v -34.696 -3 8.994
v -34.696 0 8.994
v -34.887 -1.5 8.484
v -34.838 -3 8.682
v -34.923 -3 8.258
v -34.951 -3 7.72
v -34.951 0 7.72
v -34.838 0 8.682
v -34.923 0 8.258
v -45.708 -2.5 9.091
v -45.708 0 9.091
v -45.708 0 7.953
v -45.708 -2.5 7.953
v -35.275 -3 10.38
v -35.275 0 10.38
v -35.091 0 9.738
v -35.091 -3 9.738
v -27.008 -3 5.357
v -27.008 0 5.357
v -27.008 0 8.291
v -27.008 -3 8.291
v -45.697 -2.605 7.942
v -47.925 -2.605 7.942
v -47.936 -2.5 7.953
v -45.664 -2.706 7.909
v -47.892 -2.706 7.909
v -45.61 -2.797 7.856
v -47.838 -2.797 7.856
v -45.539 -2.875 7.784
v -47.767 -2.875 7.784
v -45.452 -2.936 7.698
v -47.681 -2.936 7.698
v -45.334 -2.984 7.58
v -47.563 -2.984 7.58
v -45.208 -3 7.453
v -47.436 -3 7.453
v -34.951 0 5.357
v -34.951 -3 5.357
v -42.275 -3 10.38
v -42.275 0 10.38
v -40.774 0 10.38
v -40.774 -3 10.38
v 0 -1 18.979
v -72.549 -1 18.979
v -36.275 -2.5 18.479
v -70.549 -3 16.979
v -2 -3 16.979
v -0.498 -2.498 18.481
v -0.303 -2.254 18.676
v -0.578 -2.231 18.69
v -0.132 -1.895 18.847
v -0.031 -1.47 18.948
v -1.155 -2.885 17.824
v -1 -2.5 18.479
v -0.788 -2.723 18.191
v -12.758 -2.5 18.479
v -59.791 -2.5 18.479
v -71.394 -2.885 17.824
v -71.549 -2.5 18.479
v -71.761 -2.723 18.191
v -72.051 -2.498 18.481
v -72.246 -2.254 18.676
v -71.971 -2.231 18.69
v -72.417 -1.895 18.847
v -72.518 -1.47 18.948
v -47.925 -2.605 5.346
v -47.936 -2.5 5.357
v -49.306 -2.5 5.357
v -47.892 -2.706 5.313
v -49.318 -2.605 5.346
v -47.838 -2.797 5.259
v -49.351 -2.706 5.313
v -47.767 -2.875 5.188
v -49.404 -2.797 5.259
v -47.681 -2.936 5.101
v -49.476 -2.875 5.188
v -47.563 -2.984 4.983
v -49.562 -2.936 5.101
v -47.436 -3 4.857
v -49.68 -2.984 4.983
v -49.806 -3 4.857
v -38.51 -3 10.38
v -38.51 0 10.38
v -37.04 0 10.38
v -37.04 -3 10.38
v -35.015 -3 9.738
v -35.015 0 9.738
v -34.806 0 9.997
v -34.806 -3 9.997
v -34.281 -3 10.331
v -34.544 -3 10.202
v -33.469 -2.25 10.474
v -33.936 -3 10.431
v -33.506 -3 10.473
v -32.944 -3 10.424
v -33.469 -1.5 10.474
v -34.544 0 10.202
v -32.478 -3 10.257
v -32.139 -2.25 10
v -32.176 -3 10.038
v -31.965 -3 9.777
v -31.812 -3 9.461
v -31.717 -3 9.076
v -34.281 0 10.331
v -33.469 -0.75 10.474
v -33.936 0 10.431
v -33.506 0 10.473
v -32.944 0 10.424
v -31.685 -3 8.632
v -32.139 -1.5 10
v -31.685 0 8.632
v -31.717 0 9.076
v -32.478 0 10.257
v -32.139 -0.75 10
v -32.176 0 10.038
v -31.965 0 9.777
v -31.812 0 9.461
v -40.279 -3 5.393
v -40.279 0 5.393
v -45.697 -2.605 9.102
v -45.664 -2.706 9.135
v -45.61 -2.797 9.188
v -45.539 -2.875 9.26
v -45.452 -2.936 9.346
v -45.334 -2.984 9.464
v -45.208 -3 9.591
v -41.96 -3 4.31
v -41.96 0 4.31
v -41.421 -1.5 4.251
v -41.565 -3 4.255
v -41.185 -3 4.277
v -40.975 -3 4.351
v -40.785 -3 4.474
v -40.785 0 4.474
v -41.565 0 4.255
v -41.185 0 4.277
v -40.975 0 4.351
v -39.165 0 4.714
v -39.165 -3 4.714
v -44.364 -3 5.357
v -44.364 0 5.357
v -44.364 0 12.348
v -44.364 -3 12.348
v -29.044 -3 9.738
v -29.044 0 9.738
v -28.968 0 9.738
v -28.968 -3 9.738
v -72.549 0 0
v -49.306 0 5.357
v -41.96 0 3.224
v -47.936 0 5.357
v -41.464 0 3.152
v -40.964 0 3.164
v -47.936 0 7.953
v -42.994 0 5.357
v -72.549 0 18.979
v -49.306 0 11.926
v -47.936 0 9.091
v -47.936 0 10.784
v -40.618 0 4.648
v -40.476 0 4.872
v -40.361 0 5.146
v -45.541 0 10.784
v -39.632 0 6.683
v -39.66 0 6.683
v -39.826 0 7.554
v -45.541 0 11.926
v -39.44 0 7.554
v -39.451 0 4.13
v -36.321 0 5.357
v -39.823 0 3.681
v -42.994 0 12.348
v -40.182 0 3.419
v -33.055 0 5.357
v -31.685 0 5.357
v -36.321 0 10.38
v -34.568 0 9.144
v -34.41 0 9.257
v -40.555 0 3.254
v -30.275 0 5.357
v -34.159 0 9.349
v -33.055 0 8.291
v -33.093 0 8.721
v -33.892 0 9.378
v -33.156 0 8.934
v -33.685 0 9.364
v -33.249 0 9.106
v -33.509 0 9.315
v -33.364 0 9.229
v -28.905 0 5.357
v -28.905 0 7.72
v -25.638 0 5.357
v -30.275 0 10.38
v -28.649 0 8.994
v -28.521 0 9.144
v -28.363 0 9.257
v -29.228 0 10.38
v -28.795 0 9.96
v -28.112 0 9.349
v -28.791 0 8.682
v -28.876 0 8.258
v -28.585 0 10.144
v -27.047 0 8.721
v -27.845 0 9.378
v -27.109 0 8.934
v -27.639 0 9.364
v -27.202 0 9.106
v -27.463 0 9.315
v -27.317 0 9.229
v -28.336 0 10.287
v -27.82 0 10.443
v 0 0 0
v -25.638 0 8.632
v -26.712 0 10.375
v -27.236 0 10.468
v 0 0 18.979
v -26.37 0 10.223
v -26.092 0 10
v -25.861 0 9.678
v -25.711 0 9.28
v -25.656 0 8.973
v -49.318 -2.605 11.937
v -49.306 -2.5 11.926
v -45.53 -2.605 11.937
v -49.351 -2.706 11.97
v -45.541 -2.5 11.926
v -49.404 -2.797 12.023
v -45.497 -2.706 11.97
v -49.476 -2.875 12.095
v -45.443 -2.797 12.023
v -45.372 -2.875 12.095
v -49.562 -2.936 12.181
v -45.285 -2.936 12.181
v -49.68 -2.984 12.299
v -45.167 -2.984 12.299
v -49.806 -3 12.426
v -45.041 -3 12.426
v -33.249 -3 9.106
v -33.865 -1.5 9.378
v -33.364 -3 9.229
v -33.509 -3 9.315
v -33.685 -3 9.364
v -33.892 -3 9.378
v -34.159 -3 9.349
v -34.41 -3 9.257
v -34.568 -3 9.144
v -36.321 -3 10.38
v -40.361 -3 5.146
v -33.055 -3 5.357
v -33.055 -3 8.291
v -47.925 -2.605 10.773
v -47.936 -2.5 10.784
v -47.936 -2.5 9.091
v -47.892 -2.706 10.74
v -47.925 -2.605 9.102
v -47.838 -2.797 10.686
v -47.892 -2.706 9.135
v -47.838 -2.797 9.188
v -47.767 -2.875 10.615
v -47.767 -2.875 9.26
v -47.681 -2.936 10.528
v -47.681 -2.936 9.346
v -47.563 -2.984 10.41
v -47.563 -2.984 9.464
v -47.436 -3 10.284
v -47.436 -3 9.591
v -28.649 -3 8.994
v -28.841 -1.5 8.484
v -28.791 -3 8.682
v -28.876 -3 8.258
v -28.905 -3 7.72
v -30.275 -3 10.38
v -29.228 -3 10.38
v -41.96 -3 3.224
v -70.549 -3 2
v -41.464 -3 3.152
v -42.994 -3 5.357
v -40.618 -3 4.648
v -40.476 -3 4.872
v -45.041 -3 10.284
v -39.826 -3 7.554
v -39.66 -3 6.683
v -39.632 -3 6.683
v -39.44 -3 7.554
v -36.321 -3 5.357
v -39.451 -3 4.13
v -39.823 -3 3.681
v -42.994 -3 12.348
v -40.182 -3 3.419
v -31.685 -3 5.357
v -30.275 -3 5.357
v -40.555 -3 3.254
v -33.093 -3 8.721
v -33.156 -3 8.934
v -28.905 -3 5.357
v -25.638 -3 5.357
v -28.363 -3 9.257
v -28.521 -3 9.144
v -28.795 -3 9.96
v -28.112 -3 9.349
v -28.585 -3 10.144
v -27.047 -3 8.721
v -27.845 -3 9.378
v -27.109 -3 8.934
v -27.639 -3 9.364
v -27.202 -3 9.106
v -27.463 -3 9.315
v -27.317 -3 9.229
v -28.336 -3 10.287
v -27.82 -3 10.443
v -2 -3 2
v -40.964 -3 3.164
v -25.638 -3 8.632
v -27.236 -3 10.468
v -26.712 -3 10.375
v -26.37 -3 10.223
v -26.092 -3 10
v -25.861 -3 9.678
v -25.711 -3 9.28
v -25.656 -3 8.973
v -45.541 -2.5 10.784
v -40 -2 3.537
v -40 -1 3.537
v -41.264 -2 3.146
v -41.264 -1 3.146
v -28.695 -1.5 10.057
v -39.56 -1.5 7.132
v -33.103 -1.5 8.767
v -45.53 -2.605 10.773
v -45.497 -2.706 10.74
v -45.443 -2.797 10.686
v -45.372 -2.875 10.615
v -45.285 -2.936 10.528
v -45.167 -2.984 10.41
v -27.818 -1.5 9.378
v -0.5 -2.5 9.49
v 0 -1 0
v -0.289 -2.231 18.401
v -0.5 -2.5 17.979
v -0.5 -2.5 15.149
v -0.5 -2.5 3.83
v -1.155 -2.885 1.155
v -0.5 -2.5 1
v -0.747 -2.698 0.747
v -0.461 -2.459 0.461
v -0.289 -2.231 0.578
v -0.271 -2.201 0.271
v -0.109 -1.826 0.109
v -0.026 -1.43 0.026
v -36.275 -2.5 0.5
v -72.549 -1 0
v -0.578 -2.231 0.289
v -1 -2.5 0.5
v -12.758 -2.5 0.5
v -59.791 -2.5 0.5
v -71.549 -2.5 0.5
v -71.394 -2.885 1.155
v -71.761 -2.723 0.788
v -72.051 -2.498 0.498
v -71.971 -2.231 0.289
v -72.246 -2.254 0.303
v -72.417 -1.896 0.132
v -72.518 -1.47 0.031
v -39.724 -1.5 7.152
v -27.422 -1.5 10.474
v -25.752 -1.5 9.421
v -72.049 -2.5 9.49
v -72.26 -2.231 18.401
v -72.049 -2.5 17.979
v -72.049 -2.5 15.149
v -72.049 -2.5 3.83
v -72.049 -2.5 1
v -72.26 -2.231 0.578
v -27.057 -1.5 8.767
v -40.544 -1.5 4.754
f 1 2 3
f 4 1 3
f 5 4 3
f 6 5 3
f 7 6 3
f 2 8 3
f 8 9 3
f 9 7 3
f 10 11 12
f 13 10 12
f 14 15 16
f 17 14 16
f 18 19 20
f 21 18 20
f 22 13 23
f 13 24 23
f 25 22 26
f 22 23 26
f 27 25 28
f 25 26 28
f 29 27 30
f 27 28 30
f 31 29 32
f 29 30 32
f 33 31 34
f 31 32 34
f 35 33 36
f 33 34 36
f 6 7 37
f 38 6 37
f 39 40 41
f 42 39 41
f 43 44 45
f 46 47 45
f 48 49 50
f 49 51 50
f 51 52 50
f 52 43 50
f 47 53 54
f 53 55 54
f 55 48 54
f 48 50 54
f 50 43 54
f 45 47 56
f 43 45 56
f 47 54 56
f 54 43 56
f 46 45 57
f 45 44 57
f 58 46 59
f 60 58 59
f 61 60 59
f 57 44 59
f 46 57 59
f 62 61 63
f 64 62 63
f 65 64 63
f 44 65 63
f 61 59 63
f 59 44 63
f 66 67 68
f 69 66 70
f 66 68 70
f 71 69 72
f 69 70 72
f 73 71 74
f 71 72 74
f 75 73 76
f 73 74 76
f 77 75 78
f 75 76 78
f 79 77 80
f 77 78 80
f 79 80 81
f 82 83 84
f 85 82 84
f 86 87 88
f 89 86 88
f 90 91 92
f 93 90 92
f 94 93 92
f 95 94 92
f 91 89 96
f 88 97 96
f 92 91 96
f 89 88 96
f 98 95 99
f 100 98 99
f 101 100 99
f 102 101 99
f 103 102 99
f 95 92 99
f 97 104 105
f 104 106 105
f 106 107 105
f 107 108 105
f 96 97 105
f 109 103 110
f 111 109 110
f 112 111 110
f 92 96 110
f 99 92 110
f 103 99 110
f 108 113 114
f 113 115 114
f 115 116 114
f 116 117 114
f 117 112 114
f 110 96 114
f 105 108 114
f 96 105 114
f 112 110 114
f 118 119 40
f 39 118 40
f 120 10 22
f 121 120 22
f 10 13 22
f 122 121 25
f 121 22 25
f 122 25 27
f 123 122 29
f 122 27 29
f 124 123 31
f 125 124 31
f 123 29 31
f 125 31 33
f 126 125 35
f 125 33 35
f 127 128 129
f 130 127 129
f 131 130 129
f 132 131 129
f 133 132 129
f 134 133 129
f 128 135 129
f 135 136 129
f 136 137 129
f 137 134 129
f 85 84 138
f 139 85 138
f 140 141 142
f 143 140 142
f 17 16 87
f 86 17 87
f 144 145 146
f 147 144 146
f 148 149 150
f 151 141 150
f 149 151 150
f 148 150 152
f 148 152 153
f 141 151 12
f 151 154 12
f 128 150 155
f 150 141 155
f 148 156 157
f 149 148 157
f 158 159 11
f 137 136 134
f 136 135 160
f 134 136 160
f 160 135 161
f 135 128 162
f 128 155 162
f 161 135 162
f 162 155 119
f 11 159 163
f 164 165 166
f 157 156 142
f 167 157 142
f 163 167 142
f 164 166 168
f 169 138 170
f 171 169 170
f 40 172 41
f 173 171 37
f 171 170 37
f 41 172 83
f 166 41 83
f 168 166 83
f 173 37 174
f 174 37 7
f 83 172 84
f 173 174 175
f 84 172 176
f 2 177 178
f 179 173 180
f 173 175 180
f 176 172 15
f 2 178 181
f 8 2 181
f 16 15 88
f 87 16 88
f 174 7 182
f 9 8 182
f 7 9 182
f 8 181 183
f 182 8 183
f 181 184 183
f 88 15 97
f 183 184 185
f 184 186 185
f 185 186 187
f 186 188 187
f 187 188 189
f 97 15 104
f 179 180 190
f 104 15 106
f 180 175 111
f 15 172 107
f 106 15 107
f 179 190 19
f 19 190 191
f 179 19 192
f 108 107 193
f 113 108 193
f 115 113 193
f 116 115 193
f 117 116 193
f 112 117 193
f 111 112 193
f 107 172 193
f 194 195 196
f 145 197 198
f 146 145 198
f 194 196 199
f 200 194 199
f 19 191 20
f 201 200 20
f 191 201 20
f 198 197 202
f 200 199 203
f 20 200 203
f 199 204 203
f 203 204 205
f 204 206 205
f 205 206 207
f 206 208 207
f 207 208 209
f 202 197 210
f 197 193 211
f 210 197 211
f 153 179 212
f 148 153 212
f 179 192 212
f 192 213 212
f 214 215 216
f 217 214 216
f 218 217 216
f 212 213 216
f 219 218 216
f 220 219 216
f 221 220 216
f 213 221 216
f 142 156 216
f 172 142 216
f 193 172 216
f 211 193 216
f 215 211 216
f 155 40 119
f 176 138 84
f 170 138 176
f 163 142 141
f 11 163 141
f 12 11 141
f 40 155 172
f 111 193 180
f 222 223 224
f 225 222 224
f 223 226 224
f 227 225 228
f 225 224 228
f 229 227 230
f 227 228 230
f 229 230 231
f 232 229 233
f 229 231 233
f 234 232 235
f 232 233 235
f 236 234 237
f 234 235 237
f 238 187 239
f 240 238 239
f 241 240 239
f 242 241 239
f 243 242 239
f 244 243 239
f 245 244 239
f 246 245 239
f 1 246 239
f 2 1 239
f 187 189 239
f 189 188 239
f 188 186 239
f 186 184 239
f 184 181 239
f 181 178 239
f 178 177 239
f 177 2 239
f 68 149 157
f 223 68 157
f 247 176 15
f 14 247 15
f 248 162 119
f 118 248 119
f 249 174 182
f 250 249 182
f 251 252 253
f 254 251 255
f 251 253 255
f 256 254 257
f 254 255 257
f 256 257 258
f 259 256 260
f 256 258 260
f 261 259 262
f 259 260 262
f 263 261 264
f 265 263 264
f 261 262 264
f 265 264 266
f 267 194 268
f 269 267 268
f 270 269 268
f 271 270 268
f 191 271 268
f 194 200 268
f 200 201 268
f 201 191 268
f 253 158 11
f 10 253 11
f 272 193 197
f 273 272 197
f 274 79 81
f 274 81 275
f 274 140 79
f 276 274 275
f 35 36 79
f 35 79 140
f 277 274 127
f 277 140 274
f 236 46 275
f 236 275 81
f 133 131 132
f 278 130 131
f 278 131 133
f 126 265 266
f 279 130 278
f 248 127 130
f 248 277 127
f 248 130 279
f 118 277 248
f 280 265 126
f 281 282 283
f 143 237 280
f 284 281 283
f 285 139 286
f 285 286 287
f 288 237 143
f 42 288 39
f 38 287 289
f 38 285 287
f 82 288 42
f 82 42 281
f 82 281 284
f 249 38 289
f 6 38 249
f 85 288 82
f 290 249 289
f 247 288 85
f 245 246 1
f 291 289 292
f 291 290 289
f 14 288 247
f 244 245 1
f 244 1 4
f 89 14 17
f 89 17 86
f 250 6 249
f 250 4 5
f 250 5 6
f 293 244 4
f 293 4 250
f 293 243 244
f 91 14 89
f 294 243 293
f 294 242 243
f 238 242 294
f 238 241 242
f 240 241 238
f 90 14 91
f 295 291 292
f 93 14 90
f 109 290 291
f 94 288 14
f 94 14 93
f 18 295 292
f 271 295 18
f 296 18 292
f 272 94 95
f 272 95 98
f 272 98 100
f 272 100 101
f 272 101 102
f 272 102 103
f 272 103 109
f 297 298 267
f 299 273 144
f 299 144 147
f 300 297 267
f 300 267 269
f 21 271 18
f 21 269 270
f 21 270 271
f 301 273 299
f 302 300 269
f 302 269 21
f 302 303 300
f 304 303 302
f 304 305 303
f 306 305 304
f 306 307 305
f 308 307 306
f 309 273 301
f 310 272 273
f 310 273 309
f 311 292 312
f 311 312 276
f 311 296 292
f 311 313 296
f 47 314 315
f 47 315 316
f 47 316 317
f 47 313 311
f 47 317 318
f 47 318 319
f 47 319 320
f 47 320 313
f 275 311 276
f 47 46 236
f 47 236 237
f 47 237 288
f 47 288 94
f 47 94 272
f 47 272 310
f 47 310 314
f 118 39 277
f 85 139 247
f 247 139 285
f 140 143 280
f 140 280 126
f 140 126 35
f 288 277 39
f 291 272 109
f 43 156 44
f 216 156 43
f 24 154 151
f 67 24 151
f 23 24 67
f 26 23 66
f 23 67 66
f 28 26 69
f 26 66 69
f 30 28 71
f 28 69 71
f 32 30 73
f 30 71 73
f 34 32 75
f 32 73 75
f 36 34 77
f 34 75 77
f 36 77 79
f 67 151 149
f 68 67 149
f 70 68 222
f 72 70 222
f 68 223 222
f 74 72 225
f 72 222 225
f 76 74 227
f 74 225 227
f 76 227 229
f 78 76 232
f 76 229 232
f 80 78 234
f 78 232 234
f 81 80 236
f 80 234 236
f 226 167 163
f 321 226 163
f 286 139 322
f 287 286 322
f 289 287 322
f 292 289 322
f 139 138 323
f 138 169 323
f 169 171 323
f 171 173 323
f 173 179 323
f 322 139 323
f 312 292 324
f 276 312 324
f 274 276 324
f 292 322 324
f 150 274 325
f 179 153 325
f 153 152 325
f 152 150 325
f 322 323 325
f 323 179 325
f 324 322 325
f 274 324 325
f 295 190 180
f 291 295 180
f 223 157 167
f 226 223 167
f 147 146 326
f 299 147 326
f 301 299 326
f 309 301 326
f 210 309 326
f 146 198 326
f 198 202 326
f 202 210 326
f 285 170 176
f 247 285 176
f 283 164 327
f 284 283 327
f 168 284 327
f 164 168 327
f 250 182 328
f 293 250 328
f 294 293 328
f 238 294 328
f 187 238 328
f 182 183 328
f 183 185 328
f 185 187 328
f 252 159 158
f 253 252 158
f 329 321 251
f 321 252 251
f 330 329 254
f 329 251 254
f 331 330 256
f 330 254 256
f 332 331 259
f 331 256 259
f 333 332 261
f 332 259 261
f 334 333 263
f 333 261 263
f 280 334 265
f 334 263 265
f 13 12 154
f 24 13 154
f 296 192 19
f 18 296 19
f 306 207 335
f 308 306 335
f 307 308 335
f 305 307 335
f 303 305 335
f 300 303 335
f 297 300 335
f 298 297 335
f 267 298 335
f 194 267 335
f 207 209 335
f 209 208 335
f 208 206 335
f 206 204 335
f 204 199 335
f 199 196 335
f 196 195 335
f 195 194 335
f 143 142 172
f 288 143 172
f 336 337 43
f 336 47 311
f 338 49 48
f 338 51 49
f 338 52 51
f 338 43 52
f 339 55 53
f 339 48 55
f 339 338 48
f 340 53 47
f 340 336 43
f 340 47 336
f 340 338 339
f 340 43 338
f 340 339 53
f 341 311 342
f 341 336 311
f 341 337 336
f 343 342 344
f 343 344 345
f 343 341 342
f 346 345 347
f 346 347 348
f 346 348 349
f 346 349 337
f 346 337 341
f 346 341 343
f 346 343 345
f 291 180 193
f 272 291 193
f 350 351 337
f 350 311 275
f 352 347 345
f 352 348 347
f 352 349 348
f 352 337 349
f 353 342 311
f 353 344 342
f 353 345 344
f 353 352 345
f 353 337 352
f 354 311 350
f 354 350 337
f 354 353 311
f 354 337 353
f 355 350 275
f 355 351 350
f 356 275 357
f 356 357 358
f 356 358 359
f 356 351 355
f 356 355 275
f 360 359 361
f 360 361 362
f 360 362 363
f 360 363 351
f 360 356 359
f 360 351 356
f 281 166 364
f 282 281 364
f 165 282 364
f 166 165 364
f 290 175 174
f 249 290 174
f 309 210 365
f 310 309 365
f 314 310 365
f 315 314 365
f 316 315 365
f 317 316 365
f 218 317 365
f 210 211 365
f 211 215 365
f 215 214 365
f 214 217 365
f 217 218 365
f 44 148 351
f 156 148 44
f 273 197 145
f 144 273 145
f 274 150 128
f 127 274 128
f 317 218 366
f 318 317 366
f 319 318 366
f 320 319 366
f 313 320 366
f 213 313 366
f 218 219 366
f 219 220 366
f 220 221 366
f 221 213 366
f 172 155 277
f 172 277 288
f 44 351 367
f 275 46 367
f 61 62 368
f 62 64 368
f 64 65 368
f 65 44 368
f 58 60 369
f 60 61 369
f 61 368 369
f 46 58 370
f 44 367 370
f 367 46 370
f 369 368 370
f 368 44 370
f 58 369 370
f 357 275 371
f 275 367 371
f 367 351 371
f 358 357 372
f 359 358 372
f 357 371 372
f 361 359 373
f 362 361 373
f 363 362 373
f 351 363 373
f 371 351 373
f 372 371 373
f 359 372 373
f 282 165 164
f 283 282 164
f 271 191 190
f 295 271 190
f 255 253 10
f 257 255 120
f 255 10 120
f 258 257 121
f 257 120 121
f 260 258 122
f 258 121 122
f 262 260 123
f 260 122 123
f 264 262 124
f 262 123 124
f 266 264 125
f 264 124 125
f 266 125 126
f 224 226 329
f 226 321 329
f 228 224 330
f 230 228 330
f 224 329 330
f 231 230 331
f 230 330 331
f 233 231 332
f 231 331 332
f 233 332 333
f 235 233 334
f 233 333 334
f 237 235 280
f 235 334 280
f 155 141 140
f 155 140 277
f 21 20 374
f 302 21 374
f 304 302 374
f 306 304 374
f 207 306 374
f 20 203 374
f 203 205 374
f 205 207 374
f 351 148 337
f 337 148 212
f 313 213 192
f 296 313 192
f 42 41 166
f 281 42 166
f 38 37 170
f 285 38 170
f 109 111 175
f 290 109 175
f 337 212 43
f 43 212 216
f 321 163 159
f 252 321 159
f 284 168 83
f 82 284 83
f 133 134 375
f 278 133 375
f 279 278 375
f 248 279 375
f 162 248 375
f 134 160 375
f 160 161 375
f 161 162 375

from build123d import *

# Parameters (mm, degrees)
F0_W        = 72.5492089987
F0_H        = 18.9791209996
F0_W_2      = 1.3700789067
F0_H_2      = 6.9912840748
F1_DEPTH    = 3
F2_T1_DEPTH = 82.5492089987
F2_T3_DEPTH = 28.9791209996
F3_R        = 0.5


# Not quite as in the source:
# - a fillet or chamfer that OpenCascade refuses, or shapes differently, is made with other operations: its cross-section is extruded or revolved along the edge and cut away or added


with BuildPart() as f1:
    # F0 (on Front) → F1 (new body)
    with BuildSketch(Plane.XZ):
        with Locations((-36.2746044993, 9.4895604998)):
            Rectangle(F0_W, F0_H)
        with BuildLine():
            Line((-40.2793404323, 5.3929338044), (-42.2747963845, 10.3801360367))
            Line((-42.2747963845, 10.3801360367), (-40.7738914752, 10.3801360367))
            Line((-40.7738914752, 10.3801360367), (-39.8264811924, 7.5537193204))
            add(Edge.make_bspline(
                [(-39.8264811924, 7.5537193204), (-39.70428108, 7.185681335), (-39.6597139803, 6.6825044018)],
                knots=[0, 0, 0, 1, 1, 1], degree=2))
            Line((-39.6597139803, 6.6825044018), (-39.632398661, 6.6825044018))
            add(Edge.make_bspline(
                [(-39.632398661, 6.6825044018), (-39.5835186161, 7.1454271804), (-39.439753778, 7.5537193204)],
                knots=[0, 0, 0, 1, 1, 1], degree=2))
            Line((-39.439753778, 7.5537193204), (-38.5095952758, 10.3801360367))
            Line((-38.5095952758, 10.3801360367), (-37.0403186308, 10.3801360367))
            Line((-37.0403186308, 10.3801360367), (-39.1651629373, 4.7143637688))
            add(Edge.make_bspline(
                [(-39.1651629373, 4.7143637688), (-39.458443207, 3.9279701046), (-39.9997178223, 3.5369297451)],
                knots=[0, 0, 0, 1, 1, 1], degree=2))
            add(Edge.make_bspline(
                [(-39.9997178223, 3.5369297451), (-40.5409924376, 3.1458893856), (-41.264129573, 3.1458893856)],
                knots=[0, 0, 0, 1, 1, 1], degree=2))
            add(Edge.make_bspline(
                [(-41.264129573, 3.1458893856), (-41.619228723, 3.1458893856), (-41.9599513892, 3.2235223981)],
                knots=[0, 0, 0, 1, 1, 1], degree=2))
            Line((-41.9599513892, 3.2235223981), (-41.9599513892, 4.3103845738))
            add(Edge.make_bspline(
                [(-41.9599513892, 4.3103845738), (-41.7126758677, 4.2514409902), (-41.4208332465, 4.2514409902)],
                knots=[0, 0, 0, 1, 1, 1], degree=2))
            add(Edge.make_bspline(
                [(-41.4208332465, 4.2514409902), (-41.0571082062, 4.2514409902), (-40.7853926623, 4.4742764892)],
                knots=[0, 0, 0, 1, 1, 1], degree=2))
            add(Edge.make_bspline(
                [(-40.7853926623, 4.4742764892), (-40.5136771183, 4.6971119882), (-40.36128639, 5.145658283)],
                knots=[0, 0, 0, 1, 1, 1], degree=2))
            Line((-40.36128639, 5.145658283), (-40.2793404323, 5.3929338044))
        make_face(mode=Mode.SUBTRACT)
        Polygon((-47.9362557073, 7.9533855702), (-47.9362557073, 5.3569925949), (-49.306334614, 5.3569925949), (-49.306334614, 11.9256080458), (-45.5411335052, 11.9256080458), (-45.5411335052, 10.7841152316), (-47.9362557073, 10.7841152316), (-47.9362557073, 9.0905654393), (-45.7079007174, 9.0905654393), (-45.7079007174, 7.9533855702), align=None, mode=Mode.SUBTRACT)
        with Locations((-43.6786600282, 8.8526346323)):
            Rectangle(F0_W_2, F0_H_2, mode=Mode.SUBTRACT)
        with BuildLine():
            Line((-31.6850784131, 8.6319556059), (-31.6850784131, 5.3569925949))
            Line((-31.6850784131, 5.3569925949), (-33.0551573198, 5.3569925949))
            Line((-33.0551573198, 5.3569925949), (-33.0551573198, 8.2912329397))
            add(Edge.make_bspline(
                [(-33.0551573198, 8.2912329397), (-33.0551573198, 8.8346640275), (-33.248521027, 9.1063795715)],
                knots=[0, 0, 0, 1, 1, 1], degree=2))
            add(Edge.make_bspline(
                [(-33.248521027, 9.1063795715), (-33.4418847342, 9.3780951154), (-33.8645533581, 9.3780951154)],
                knots=[0, 0, 0, 1, 1, 1], degree=2))
            add(Edge.make_bspline(
                [(-33.8645533581, 9.3780951154), (-34.4396127103, 9.3780951154), (-34.6955141221, 8.9942429978)],
                knots=[0, 0, 0, 1, 1, 1], degree=2))
            add(Edge.make_bspline(
                [(-34.6955141221, 8.9942429978), (-34.9514155338, 8.6103908802), (-34.9514155338, 7.7204865326)],
                knots=[0, 0, 0, 1, 1, 1], degree=2))
            Line((-34.9514155338, 7.7204865326), (-34.9514155338, 5.3569925949))
            Line((-34.9514155338, 5.3569925949), (-36.3214944405, 5.3569925949))
            Line((-36.3214944405, 5.3569925949), (-36.3214944405, 10.3801360367))
            Line((-36.3214944405, 10.3801360367), (-35.2748864195, 10.3801360367))
            Line((-35.2748864195, 10.3801360367), (-35.0908674267, 9.7375072106))
            Line((-35.0908674267, 9.7375072106), (-35.0146720626, 9.7375072106))
            add(Edge.make_bspline(
                [(-35.0146720626, 9.7375072106), (-34.7846483217, 10.1012322508), (-34.3828255993, 10.2874077161)],
                knots=[0, 0, 0, 1, 1, 1], degree=2))
            add(Edge.make_bspline(
                [(-34.3828255993, 10.2874077161), (-33.9810028769, 10.4735831814), (-33.4692000534, 10.4735831814)],
                knots=[0, 0, 0, 1, 1, 1], degree=2))
            add(Edge.make_bspline(
                [(-33.4692000534, 10.4735831814), (-32.5922345413, 10.4735831814), (-32.1386564772, 9.99987804)],
                knots=[0, 0, 0, 1, 1, 1], degree=2))
            add(Edge.make_bspline(
                [(-32.1386564772, 9.99987804), (-31.6850784131, 9.5261728986), (-31.6850784131, 8.6319556059)],
                knots=[0, 0, 0, 1, 1, 1], degree=2))
        make_face(mode=Mode.SUBTRACT)
        with BuildLine():
            Line((-25.6383293244, 8.6319556059), (-25.6383293244, 5.3569925949))
            Line((-25.6383293244, 5.3569925949), (-27.0084082311, 5.3569925949))
            Line((-27.0084082311, 5.3569925949), (-27.0084082311, 8.2912329397))
            add(Edge.make_bspline(
                [(-27.0084082311, 8.2912329397), (-27.0084082311, 8.8346640275), (-27.2017719383, 9.1063795715)],
                knots=[0, 0, 0, 1, 1, 1], degree=2))
            add(Edge.make_bspline(
                [(-27.2017719383, 9.1063795715), (-27.3951356454, 9.3780951154), (-27.8178042693, 9.3780951154)],
                knots=[0, 0, 0, 1, 1, 1], degree=2))
            add(Edge.make_bspline(
                [(-27.8178042693, 9.3780951154), (-28.3928636216, 9.3780951154), (-28.6487650333, 8.9942429978)],
                knots=[0, 0, 0, 1, 1, 1], degree=2))
            add(Edge.make_bspline(
                [(-28.6487650333, 8.9942429978), (-28.9046664451, 8.6103908802), (-28.9046664451, 7.7204865326)],
                knots=[0, 0, 0, 1, 1, 1], degree=2))
            Line((-28.9046664451, 7.7204865326), (-28.9046664451, 5.3569925949))
            Line((-28.9046664451, 5.3569925949), (-30.2747453518, 5.3569925949))
            Line((-30.2747453518, 5.3569925949), (-30.2747453518, 10.3801360367))
            Line((-30.2747453518, 10.3801360367), (-29.2281373307, 10.3801360367))
            Line((-29.2281373307, 10.3801360367), (-29.044118338, 9.7375072106))
            Line((-29.044118338, 9.7375072106), (-28.9679229738, 9.7375072106))
            add(Edge.make_bspline(
                [(-28.9679229738, 9.7375072106), (-28.7378992329, 10.1012322508), (-28.3360765105, 10.2874077161)],
                knots=[0, 0, 0, 1, 1, 1], degree=2))
            add(Edge.make_bspline(
                [(-28.3360765105, 10.2874077161), (-27.9342537882, 10.4735831814), (-27.4224509647, 10.4735831814)],
                knots=[0, 0, 0, 1, 1, 1], degree=2))
            add(Edge.make_bspline(
                [(-27.4224509647, 10.4735831814), (-26.5454854525, 10.4735831814), (-26.0919073884, 9.99987804)],
                knots=[0, 0, 0, 1, 1, 1], degree=2))
            add(Edge.make_bspline(
                [(-26.0919073884, 9.99987804), (-25.6383293244, 9.5261728986), (-25.6383293244, 8.6319556059)],
                knots=[0, 0, 0, 1, 1, 1], degree=2))
        make_face(mode=Mode.SUBTRACT)
    extrude(amount=F1_DEPTH)

    # F2: fillet of radius 2 on 4 edges, made by hand

    # F2_s2 → F2_t1 (cut)
    with BuildSketch(Plane.YZ.offset(-77.5492089987)):
        with BuildLine():
            add(Edge.make_bspline(
                [(-1, 18.9791209996), (-3, 18.9791209996), (-3, 16.9791209996)],
                knots=[0, 0, 0, 1, 1, 1], degree=2, weights=[1, 1, 1]))
            Line((-3, 16.9791209996), (-3, 18.9791209996))
            Line((-3, 18.9791209996), (-1, 18.9791209996))
        make_face()
        with BuildLine():
            add(Edge.make_bspline(
                [(-1, 0), (-3, 0), (-3, 2)],
                knots=[0, 0, 0, 1, 1, 1], degree=2, weights=[1, 1, 1]))
            Line((-3, 2), (-3, 0))
            Line((-3, 0), (-1, 0))
        make_face()
    extrude(amount=F2_T1_DEPTH, mode=Mode.SUBTRACT)

    # F2_s4 → F2_t3 (cut)
    with BuildSketch(Plane.XY.offset(-5)):
        with BuildLine():
            add(Edge.make_bspline(
                [(-72.5492089987, -1), (-72.5492089987, -3), (-70.5492089987, -3)],
                knots=[0, 0, 0, 1, 1, 1], degree=2, weights=[1, 1, 1]))
            Line((-70.5492089987, -3), (-72.5492089987, -3))
            Line((-72.5492089987, -3), (-72.5492089987, -1))
        make_face()
        with BuildLine():
            add(Edge.make_bspline(
                [(0, -1), (0, -3), (-2, -3)],
                knots=[0, 0, 0, 1, 1, 1], degree=2, weights=[1, 1, 1]))
            Line((-2, -3), (0, -3))
            Line((0, -3), (0, -1))
        make_face()
    extrude(amount=F2_T3_DEPTH, mode=Mode.SUBTRACT)

    # F3
    f3_edges = [f1.edges().sort_by_distance(p)[0] for p in [
        (-49.306335, -3, 8.6413),
        (-47.423734, -3, 11.925608),
        (-45.541134, -3, 11.354862),
        (-46.738695, -3, 10.784115),
        (-47.936256, -3, 9.93734),
        (-46.822078, -3, 9.090565),
        (-45.707901, -3, 8.521976),
        (-46.822078, -3, 7.953386),
        (-47.936256, -3, 6.655189),
        (-48.621295, -3, 5.356993),
    ]]
    fillet(f3_edges, radius=F3_R)


solid = f1.part
